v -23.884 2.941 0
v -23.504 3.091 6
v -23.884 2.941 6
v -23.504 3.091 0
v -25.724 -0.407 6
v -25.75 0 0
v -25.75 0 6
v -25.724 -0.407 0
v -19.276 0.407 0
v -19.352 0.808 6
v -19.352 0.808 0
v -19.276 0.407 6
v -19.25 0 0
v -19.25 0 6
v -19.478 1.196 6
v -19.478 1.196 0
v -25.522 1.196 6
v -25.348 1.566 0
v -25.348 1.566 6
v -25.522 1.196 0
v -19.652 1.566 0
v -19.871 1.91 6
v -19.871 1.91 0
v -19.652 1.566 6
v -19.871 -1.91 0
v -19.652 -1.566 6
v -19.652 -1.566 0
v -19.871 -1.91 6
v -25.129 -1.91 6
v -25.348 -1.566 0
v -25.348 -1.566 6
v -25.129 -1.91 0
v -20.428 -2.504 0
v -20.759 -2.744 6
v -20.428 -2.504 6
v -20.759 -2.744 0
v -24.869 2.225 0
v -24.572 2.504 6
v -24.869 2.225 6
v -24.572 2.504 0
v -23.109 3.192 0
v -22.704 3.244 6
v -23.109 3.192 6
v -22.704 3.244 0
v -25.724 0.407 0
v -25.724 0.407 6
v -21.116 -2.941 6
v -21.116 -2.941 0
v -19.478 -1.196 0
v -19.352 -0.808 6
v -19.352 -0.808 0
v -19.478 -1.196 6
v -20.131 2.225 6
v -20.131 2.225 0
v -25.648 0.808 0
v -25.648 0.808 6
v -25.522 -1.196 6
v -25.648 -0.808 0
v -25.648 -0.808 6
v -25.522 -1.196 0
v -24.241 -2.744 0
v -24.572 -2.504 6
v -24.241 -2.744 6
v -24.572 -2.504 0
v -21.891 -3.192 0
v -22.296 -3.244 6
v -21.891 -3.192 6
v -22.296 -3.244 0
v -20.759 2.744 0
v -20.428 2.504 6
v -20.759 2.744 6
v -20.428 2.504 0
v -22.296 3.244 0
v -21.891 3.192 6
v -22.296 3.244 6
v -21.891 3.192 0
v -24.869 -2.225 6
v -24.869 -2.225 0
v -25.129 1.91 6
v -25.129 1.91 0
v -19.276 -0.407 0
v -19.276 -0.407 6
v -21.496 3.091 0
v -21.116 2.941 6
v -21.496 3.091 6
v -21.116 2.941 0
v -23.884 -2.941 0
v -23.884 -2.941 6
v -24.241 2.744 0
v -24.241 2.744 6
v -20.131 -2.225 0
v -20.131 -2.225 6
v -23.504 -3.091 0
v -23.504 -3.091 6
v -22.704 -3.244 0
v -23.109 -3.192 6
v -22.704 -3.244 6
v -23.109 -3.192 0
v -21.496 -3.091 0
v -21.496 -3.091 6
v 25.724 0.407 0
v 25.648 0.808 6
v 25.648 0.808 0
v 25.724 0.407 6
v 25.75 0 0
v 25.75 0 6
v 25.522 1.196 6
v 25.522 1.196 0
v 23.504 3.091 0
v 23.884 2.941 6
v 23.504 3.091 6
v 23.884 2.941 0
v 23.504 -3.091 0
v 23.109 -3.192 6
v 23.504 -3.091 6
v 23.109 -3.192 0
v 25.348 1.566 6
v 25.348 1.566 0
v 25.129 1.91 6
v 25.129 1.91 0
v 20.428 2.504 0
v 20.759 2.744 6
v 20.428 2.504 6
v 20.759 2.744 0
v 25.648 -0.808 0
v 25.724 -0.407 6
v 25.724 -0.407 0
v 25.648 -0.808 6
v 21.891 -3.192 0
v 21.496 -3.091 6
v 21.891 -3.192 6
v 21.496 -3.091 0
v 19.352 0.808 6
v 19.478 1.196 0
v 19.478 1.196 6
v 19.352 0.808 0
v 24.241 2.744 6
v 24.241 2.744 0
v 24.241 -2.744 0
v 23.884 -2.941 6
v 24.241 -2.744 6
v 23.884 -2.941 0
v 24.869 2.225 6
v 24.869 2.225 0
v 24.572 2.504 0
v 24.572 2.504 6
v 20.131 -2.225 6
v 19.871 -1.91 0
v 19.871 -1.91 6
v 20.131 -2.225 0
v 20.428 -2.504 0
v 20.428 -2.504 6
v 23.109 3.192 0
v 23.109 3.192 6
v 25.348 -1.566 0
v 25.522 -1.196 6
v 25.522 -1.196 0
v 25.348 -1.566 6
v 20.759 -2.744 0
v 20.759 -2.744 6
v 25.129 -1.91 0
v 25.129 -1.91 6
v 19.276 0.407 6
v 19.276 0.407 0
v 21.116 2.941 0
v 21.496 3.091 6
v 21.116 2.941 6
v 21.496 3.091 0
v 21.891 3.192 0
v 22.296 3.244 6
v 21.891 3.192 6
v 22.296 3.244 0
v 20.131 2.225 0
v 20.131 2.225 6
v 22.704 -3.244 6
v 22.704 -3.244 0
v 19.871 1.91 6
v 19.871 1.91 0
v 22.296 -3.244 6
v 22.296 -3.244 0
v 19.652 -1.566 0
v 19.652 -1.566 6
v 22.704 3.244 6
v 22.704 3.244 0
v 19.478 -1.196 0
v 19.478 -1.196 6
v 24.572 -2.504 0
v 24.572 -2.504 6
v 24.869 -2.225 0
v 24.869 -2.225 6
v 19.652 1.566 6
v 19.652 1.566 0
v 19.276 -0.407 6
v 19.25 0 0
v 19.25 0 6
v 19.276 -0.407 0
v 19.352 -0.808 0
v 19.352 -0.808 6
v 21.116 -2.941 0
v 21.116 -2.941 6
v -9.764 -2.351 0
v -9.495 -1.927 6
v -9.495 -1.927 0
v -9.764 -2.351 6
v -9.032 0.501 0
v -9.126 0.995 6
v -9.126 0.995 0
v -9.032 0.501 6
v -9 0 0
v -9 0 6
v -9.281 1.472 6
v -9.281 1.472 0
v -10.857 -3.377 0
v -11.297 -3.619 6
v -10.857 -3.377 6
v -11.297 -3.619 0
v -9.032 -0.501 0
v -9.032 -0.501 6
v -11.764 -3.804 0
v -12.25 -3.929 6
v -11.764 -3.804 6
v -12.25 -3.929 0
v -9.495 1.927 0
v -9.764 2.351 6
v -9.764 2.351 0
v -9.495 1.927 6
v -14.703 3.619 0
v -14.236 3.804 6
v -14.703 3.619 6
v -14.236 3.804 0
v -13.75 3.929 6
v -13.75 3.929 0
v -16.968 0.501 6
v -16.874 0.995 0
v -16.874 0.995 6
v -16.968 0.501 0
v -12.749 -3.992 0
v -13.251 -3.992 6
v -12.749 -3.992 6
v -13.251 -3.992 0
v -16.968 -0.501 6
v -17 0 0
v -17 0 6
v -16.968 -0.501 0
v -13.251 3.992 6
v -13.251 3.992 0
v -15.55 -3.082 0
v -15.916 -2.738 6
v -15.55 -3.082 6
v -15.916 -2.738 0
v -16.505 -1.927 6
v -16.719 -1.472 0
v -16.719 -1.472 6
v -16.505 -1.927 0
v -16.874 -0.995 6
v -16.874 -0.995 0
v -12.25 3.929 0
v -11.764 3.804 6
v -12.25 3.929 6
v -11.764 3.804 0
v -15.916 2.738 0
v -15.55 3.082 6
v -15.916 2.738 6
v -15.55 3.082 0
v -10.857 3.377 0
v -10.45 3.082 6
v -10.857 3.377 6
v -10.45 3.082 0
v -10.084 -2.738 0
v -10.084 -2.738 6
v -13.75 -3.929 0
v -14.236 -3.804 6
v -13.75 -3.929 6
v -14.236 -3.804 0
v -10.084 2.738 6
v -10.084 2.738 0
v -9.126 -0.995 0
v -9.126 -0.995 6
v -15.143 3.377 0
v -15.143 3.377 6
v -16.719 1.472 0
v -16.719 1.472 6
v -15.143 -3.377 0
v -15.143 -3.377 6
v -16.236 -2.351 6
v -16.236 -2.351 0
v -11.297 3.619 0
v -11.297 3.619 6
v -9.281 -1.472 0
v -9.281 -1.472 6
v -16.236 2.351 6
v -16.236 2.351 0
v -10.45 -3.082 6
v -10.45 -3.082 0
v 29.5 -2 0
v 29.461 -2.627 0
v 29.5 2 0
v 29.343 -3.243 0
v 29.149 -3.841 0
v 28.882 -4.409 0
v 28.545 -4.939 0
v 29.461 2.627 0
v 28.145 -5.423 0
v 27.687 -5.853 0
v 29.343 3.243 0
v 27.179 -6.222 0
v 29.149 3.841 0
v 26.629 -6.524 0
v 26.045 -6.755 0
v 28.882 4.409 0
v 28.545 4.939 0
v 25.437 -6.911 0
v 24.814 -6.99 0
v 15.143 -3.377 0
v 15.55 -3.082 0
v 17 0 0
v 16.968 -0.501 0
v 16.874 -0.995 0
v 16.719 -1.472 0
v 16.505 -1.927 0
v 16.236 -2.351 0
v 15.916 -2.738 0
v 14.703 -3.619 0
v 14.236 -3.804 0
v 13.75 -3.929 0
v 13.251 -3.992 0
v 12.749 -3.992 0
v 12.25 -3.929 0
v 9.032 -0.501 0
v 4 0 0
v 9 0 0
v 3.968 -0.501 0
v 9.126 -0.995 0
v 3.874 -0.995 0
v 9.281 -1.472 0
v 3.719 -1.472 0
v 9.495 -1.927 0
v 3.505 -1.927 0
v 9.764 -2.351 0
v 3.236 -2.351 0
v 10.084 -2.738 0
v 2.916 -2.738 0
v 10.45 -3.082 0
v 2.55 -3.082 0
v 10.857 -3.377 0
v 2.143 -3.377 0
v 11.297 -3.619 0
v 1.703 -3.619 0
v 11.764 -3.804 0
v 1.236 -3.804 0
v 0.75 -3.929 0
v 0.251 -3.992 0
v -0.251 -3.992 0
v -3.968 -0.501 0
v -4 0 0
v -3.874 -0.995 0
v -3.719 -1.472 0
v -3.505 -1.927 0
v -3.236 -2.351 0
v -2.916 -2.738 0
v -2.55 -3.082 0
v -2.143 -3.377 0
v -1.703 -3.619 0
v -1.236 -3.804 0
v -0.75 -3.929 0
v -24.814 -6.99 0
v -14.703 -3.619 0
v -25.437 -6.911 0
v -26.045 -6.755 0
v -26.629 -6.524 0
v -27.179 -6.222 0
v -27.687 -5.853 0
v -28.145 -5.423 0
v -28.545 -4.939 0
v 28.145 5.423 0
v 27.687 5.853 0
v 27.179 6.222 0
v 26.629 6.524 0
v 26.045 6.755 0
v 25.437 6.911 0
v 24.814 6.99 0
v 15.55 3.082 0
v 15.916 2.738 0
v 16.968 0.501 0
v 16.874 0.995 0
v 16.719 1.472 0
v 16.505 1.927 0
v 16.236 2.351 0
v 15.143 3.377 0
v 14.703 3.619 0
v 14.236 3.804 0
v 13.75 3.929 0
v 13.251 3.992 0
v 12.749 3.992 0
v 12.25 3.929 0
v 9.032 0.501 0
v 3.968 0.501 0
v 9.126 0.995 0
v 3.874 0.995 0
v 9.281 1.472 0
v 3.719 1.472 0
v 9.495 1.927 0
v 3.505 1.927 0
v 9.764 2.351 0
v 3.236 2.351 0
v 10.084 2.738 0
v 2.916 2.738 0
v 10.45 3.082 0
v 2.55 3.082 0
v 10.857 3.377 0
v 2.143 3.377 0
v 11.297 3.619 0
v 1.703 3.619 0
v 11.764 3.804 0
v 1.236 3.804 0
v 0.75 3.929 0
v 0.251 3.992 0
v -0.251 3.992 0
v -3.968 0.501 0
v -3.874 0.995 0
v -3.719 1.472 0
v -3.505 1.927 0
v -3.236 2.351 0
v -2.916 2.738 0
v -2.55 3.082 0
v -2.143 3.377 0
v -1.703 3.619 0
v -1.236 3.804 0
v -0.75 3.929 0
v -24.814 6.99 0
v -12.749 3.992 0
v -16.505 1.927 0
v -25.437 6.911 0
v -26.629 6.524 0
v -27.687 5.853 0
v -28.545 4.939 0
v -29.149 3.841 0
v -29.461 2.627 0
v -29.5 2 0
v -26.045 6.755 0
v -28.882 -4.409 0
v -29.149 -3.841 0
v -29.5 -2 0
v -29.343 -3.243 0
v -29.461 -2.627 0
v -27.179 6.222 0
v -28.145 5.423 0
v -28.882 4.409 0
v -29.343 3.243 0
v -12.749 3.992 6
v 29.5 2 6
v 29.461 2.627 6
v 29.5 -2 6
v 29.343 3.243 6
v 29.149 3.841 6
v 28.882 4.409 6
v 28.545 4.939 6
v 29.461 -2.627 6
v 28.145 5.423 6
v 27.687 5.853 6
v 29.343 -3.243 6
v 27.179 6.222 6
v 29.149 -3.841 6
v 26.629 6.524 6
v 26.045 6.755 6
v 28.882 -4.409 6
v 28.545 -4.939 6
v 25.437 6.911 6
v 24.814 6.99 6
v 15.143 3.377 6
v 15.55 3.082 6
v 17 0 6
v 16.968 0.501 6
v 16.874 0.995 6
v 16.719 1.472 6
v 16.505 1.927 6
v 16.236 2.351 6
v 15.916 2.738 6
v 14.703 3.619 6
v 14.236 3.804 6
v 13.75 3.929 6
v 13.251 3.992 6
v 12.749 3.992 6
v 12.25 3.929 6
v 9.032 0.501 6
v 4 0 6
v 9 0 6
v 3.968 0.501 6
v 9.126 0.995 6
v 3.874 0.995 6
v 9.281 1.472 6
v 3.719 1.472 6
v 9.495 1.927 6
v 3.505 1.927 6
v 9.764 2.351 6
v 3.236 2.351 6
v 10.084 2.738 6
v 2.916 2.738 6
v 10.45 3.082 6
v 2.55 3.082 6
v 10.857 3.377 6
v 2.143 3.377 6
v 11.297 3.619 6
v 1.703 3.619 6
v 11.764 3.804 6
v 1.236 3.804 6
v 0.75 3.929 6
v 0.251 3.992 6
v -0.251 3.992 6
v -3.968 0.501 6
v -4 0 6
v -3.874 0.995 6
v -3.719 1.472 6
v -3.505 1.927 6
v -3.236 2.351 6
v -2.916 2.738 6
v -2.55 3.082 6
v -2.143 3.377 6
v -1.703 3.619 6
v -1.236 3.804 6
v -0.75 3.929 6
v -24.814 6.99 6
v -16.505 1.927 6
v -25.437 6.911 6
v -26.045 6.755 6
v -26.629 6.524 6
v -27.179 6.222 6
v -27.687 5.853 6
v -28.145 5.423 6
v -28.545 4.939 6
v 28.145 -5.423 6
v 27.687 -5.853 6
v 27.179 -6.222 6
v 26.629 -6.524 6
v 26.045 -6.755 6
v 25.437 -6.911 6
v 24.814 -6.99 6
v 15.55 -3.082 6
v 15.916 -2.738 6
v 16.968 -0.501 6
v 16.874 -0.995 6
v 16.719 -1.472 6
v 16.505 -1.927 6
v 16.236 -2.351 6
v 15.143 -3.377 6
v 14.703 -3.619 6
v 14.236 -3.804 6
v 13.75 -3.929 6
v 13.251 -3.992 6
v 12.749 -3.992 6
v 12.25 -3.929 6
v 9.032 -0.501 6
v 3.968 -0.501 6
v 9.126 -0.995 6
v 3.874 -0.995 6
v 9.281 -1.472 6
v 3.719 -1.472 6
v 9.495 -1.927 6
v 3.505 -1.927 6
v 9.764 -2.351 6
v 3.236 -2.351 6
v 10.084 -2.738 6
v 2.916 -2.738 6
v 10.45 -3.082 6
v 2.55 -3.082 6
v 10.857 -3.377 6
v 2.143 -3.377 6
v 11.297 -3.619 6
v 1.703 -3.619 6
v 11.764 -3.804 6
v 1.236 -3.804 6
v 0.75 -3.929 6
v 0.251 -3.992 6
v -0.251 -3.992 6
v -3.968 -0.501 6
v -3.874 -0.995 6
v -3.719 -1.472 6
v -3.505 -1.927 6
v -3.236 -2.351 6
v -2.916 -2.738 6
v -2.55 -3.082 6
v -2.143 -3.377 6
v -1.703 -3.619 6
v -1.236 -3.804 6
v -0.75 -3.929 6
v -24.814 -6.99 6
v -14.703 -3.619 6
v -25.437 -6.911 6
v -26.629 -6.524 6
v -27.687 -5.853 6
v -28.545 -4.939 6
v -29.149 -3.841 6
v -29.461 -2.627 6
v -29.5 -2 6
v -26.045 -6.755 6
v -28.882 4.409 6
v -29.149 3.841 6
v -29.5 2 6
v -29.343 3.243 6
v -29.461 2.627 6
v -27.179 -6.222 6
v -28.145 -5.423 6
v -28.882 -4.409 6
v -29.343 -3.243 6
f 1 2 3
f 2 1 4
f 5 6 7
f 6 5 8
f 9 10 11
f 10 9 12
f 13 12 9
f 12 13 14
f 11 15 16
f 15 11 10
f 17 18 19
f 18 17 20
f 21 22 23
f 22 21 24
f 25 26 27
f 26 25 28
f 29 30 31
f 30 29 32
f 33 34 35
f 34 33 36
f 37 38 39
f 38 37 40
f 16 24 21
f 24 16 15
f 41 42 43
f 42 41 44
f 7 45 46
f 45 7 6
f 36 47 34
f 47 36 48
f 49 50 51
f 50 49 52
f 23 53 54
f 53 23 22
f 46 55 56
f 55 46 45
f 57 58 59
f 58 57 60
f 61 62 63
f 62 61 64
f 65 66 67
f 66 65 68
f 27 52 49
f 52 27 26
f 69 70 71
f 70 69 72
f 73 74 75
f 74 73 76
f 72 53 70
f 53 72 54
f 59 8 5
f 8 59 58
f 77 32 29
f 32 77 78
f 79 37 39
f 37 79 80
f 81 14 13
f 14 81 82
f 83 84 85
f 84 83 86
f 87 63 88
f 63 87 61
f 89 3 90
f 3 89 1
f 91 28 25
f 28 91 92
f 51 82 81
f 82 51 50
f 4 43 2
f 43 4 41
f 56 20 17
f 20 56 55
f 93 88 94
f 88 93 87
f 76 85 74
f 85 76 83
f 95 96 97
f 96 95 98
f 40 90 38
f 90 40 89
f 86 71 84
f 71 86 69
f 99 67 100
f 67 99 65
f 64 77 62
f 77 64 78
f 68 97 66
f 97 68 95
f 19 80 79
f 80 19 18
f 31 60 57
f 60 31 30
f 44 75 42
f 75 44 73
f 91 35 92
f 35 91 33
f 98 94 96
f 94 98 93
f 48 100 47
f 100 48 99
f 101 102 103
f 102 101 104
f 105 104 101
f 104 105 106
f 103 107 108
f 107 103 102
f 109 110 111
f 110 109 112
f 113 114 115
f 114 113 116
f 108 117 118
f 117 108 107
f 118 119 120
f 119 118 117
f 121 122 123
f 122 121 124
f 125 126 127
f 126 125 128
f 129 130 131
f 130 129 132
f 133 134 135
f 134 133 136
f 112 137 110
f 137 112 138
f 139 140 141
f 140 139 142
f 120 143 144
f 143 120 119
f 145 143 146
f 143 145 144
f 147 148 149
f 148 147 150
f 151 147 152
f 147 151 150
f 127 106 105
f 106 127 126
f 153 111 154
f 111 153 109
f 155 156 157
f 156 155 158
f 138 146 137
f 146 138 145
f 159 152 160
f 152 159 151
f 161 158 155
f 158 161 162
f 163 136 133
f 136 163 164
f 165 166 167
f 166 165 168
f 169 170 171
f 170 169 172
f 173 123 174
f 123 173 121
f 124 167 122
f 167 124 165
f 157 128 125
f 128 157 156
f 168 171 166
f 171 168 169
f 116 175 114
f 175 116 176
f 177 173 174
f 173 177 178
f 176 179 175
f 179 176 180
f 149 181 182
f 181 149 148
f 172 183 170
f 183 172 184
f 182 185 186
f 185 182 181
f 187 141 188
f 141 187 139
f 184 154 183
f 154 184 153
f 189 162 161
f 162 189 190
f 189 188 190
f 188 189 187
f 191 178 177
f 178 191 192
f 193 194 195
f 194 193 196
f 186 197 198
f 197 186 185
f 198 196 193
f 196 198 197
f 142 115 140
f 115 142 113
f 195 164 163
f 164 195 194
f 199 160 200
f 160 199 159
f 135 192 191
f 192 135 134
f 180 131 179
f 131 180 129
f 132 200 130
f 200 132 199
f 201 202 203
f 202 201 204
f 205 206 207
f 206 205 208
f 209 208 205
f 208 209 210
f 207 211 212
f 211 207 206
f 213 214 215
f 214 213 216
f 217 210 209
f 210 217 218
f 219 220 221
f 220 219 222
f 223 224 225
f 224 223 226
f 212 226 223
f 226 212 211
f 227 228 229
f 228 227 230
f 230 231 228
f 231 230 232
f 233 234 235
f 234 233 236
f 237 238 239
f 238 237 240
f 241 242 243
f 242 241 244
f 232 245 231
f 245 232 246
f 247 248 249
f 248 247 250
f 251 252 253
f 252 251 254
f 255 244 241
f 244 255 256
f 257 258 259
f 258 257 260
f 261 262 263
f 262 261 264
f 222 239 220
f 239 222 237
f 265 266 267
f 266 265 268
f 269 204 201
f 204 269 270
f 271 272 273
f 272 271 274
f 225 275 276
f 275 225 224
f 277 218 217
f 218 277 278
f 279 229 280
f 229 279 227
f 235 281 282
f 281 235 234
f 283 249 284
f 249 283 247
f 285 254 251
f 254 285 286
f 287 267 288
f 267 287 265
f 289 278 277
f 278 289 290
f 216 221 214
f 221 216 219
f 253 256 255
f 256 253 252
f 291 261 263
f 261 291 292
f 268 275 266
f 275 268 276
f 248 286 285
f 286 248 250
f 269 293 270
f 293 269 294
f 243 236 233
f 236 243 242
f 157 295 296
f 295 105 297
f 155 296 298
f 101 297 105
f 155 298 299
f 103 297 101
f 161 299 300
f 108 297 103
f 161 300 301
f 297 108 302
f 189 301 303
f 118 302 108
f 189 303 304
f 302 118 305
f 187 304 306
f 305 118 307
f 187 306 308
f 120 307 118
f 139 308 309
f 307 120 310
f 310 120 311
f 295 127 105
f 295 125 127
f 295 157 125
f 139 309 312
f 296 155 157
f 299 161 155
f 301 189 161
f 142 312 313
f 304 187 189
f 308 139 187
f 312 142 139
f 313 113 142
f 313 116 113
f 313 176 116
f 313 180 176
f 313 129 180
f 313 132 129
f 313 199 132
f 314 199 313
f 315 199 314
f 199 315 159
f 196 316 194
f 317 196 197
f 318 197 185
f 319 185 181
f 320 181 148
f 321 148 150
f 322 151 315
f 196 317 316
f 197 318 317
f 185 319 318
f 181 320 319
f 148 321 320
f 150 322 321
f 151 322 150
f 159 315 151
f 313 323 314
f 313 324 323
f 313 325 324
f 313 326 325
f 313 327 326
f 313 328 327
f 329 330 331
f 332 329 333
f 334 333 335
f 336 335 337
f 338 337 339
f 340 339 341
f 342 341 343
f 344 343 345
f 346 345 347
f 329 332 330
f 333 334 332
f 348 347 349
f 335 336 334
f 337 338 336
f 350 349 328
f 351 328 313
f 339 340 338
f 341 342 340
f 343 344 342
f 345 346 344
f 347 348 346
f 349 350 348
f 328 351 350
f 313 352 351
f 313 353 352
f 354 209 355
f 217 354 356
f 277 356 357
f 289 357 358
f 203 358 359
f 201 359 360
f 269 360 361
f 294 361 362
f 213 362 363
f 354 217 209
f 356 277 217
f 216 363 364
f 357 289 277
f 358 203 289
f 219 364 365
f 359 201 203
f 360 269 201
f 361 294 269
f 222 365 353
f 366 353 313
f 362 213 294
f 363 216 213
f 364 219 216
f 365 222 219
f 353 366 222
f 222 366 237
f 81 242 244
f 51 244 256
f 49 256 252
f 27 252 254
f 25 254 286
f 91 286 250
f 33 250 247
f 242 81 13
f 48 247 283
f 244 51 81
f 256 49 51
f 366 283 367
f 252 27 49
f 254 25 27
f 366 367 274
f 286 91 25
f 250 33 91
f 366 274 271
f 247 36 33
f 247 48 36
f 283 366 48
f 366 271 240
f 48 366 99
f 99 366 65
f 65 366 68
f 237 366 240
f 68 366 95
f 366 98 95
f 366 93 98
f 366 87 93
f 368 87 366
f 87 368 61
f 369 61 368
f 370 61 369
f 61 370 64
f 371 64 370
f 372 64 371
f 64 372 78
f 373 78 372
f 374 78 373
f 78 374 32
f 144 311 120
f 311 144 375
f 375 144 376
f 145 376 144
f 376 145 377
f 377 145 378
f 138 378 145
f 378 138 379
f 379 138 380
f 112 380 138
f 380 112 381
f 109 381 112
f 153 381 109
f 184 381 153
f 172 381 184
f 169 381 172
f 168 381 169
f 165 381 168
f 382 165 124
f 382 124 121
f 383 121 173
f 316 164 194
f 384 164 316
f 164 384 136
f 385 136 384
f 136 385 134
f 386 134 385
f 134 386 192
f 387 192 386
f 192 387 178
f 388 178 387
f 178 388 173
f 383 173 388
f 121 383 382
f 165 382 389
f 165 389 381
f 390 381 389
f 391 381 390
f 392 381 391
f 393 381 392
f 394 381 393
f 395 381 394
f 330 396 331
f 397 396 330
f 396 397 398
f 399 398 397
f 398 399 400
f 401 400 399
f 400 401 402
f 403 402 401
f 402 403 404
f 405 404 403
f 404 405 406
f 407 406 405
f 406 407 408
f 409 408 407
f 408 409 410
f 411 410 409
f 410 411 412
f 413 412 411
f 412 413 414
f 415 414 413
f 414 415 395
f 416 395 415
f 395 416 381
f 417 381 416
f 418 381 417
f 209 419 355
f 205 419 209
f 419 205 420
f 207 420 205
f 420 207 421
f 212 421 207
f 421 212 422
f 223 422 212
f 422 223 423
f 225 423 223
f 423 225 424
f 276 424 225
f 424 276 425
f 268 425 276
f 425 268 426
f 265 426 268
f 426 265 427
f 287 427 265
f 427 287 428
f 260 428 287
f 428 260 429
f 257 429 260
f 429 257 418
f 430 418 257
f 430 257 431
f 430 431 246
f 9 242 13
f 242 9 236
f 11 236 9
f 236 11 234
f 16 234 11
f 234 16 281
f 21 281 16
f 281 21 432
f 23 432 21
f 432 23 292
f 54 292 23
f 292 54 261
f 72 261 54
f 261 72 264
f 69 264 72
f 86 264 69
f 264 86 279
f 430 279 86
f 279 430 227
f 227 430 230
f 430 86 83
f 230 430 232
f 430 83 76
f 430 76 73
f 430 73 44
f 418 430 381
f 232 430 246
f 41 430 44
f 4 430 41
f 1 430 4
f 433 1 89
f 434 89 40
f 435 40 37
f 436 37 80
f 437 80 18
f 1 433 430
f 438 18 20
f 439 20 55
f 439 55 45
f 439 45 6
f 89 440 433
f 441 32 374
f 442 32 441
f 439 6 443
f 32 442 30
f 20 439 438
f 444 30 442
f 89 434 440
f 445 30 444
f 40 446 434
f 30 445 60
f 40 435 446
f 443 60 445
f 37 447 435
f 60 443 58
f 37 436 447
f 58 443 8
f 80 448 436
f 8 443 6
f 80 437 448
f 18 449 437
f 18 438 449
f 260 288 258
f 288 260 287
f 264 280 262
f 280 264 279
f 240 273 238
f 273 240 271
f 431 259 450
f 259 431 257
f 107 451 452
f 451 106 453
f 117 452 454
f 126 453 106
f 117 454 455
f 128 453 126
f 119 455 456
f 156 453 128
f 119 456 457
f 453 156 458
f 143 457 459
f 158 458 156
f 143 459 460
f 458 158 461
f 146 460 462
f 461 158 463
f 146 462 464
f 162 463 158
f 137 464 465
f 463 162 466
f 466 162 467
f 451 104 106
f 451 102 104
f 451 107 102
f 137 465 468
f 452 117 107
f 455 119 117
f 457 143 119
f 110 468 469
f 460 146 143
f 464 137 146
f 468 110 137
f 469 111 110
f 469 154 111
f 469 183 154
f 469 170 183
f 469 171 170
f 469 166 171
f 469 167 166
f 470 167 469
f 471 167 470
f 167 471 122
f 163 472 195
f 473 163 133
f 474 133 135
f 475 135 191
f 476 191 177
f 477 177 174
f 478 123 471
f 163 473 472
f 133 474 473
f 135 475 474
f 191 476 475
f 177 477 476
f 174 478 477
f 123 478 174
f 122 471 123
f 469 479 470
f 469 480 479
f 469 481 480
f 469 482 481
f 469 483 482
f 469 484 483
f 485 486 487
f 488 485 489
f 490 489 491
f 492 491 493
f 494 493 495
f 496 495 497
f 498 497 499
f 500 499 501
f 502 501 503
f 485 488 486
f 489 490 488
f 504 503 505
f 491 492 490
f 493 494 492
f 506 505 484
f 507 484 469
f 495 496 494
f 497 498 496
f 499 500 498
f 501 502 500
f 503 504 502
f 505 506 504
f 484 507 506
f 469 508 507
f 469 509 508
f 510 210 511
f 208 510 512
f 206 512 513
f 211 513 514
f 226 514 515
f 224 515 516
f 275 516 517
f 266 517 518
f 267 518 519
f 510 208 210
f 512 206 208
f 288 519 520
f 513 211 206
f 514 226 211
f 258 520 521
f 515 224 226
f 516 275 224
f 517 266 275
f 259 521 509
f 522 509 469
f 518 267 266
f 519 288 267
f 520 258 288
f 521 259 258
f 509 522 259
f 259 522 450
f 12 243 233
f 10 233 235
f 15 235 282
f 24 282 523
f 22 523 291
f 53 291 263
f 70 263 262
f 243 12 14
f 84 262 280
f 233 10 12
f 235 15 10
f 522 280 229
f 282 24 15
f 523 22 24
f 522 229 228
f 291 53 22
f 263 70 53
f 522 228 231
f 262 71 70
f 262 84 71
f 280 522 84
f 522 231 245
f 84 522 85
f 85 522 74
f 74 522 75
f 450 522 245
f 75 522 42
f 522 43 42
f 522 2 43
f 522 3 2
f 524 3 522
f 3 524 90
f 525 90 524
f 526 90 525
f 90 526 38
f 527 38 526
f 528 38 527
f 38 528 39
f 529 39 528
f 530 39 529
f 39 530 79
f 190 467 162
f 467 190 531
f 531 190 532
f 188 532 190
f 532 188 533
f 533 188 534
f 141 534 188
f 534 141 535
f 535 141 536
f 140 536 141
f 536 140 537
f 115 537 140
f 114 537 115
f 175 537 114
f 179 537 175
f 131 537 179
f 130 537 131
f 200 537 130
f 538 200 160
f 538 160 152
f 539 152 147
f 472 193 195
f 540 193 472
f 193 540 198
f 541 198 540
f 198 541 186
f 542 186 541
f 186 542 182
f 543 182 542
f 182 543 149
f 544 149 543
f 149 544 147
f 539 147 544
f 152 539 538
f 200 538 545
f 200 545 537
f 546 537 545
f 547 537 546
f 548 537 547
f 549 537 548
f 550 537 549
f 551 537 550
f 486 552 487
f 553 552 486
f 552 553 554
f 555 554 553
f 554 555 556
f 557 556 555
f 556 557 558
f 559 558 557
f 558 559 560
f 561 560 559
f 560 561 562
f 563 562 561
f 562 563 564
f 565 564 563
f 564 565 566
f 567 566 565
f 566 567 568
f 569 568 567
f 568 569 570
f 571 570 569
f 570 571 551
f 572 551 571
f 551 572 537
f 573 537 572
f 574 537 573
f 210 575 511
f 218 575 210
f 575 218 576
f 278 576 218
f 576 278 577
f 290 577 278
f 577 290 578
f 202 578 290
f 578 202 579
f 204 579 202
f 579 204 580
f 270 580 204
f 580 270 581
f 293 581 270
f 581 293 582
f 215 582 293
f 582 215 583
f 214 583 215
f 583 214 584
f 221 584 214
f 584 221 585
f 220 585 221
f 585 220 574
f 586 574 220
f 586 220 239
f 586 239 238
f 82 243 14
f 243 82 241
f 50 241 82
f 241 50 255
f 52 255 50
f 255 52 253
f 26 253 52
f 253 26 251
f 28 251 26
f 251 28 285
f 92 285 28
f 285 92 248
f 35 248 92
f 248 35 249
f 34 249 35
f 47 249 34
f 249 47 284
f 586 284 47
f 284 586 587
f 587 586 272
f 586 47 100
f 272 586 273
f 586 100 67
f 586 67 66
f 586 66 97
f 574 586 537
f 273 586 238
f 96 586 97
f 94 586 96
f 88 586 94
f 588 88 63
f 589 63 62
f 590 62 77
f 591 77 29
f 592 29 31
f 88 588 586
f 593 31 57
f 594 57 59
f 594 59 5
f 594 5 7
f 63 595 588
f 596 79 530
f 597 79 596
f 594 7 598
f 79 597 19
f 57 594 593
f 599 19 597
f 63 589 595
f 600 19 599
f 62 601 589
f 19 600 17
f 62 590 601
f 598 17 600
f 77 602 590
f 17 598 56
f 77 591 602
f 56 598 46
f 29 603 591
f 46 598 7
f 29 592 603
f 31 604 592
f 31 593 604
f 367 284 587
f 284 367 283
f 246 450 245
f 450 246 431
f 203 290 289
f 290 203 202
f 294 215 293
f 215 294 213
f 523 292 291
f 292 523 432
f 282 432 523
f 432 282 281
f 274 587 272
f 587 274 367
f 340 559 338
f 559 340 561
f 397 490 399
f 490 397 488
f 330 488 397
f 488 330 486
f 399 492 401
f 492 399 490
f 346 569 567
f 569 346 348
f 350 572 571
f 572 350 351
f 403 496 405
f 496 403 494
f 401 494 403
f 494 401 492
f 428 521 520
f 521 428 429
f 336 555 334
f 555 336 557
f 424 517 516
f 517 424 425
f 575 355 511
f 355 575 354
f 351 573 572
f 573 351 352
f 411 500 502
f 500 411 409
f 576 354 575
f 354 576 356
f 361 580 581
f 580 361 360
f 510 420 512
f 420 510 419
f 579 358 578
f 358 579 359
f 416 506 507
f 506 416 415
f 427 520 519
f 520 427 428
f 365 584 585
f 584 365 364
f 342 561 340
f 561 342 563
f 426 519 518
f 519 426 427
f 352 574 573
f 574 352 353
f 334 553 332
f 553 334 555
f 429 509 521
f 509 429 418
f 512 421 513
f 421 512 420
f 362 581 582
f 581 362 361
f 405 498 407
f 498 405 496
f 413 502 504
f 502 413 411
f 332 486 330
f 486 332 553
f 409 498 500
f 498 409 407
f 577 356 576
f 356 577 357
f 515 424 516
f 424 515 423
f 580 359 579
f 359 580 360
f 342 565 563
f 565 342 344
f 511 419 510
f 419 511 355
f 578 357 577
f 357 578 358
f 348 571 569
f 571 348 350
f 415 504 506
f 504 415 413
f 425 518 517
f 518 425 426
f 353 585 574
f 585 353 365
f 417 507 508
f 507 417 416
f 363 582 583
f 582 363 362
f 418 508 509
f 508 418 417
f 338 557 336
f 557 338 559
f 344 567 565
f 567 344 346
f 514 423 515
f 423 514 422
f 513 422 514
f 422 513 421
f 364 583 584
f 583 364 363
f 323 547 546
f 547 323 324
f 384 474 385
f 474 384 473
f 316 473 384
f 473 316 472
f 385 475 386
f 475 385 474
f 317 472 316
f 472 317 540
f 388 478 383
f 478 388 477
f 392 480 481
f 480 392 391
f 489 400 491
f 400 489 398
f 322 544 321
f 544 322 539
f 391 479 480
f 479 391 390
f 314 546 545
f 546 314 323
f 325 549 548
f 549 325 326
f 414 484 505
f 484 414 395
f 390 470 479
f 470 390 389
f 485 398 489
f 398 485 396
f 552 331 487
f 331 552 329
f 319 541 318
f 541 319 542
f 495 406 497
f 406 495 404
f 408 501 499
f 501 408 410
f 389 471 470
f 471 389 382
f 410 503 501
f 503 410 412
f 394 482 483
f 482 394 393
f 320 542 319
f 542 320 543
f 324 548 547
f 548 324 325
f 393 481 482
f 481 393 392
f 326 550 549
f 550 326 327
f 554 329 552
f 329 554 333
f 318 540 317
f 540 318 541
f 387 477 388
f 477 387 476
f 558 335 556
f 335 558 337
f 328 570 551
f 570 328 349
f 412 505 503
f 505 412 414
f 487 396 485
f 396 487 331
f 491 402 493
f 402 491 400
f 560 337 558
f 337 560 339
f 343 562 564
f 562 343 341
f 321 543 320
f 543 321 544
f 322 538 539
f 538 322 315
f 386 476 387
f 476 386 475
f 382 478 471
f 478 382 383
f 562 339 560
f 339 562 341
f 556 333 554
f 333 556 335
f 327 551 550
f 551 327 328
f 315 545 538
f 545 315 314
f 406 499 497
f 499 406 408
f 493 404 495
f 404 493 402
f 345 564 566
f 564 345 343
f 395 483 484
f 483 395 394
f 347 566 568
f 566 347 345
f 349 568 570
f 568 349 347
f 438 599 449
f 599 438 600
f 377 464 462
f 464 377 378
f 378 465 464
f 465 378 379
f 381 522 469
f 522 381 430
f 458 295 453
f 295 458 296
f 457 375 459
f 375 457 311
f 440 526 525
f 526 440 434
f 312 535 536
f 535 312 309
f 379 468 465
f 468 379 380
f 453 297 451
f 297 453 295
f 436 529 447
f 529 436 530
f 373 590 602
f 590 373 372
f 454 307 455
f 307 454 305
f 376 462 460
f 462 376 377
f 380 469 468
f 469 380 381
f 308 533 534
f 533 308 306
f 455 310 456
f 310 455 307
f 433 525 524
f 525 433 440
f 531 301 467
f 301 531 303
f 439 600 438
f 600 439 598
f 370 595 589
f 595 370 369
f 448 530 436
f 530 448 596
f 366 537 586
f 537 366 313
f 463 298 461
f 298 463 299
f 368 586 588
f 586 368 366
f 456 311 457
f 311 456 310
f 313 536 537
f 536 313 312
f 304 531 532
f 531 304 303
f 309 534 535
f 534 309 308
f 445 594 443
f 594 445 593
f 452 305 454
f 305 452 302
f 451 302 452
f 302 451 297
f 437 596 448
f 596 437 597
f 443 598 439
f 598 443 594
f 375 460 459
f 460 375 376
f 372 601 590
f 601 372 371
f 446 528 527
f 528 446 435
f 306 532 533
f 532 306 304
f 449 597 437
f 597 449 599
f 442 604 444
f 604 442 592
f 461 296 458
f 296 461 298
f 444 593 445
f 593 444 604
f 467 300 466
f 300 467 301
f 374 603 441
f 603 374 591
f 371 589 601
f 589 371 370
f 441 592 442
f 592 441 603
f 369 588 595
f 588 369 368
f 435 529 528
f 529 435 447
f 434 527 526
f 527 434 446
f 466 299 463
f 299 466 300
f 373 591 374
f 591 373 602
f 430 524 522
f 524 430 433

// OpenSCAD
$fn = 50;


difference() {
	union() {
		hull() {
			translate(v = [-24.5000000000, 2.0000000000, 0]) {
				cylinder(h = 6, r = 5);
			}
			translate(v = [24.5000000000, 2.0000000000, 0]) {
				cylinder(h = 6, r = 5);
			}
			translate(v = [-24.5000000000, -2.0000000000, 0]) {
				cylinder(h = 6, r = 5);
			}
			translate(v = [24.5000000000, -2.0000000000, 0]) {
				cylinder(h = 6, r = 5);
			}
		}
	}
	union() {
		#translate(v = [-22.5000000000, 0.0000000000, 0]) {
			cylinder(h = 6, r = 3.2500000000);
		}
		#translate(v = [22.5000000000, 0.0000000000, 0]) {
			cylinder(h = 6, r = 3.2500000000);
		}
		#translate(v = [-22.5000000000, 0.0000000000, -100.0000000000]) {
			cylinder(h = 200, r = 3.2500000000);
		}
		#translate(v = [-22.5000000000, 0.0000000000, -100.0000000000]) {
			cylinder(h = 200, r = 3.2500000000);
		}
		#translate(v = [22.5000000000, 0.0000000000, -100.0000000000]) {
			cylinder(h = 200, r = 3.2500000000);
		}
		#translate(v = [22.5000000000, 0.0000000000, -100.0000000000]) {
			cylinder(h = 200, r = 3.2500000000);
		}
		#translate(v = [-22.5000000000, 0.0000000000, 0]) {
			cylinder(h = 6, r = 1.8000000000);
		}
		#translate(v = [22.5000000000, 0.0000000000, 0]) {
			cylinder(h = 6, r = 1.8000000000);
		}
		#translate(v = [-22.5000000000, 0.0000000000, 0]) {
			cylinder(h = 6, r = 1.8000000000);
		}
		#translate(v = [22.5000000000, 0.0000000000, 0]) {
			cylinder(h = 6, r = 1.8000000000);
		}
		#translate(v = [-22.5000000000, 0.0000000000, 0]) {
			cylinder(h = 6, r = 1.8000000000);
		}
		#translate(v = [22.5000000000, 0.0000000000, 0]) {
			cylinder(h = 6, r = 1.8000000000);
		}
		#translate(v = [-13.0000000000, 0, 0]) {
			cylinder(h = 6, r = 4.0000000000);
		}
		#cylinder(h = 6, r = 4.0000000000);
		#translate(v = [13.0000000000, 0, 0]) {
			cylinder(h = 6, r = 4.0000000000);
		}
	}
}
